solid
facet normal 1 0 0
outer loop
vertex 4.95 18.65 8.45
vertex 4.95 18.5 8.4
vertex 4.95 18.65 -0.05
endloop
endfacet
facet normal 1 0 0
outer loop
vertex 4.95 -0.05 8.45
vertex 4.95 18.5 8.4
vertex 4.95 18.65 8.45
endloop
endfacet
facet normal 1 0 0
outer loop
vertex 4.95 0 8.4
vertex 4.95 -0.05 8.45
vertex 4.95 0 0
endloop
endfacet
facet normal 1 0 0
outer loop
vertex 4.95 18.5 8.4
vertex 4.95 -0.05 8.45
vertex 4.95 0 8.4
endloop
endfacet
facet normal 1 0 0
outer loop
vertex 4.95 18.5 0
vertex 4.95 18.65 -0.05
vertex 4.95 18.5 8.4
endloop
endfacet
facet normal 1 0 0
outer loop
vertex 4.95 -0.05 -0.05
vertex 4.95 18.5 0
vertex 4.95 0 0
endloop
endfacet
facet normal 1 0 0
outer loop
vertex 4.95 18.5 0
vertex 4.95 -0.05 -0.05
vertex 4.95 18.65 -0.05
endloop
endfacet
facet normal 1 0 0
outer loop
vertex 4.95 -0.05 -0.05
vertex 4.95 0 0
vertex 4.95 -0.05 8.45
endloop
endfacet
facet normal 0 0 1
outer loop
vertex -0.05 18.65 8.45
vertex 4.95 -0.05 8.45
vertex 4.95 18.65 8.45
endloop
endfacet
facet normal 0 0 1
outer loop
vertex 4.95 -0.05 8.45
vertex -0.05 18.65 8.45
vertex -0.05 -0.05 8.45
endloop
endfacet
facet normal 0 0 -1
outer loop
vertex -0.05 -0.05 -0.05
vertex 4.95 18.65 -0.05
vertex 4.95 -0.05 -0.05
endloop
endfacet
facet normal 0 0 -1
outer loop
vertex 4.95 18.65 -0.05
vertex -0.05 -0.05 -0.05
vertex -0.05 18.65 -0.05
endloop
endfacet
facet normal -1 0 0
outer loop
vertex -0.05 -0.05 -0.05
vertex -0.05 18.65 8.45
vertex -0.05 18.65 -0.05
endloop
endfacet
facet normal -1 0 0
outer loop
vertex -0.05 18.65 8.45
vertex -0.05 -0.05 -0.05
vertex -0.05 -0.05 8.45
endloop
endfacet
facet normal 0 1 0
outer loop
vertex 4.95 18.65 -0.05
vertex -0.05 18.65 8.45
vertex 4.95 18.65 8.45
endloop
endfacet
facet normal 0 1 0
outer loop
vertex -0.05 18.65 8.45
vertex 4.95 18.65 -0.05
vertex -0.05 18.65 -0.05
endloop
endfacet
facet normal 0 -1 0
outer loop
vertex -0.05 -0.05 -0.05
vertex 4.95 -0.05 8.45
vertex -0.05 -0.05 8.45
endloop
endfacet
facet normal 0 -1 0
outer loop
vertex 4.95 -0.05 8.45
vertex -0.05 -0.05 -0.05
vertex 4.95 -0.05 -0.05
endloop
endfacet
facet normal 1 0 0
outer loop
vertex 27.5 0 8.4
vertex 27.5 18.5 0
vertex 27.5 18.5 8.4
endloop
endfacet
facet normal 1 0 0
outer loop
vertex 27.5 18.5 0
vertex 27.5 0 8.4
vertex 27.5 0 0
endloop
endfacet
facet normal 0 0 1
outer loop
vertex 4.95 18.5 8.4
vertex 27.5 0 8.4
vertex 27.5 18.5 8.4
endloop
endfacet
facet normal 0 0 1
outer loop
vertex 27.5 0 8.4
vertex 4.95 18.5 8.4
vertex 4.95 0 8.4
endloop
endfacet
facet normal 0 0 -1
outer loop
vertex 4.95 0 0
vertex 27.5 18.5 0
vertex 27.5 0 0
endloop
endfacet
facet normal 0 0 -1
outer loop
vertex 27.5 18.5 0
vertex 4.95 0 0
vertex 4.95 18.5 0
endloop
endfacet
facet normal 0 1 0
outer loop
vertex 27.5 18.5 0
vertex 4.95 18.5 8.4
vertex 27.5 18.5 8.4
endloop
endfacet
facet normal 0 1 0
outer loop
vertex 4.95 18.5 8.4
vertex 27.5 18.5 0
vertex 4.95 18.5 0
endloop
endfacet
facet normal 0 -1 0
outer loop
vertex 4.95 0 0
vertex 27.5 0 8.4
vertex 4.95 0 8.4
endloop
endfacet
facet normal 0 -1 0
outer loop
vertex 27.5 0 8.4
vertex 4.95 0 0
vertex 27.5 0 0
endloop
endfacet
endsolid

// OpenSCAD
module battery(){
  translate([-0.05,-0.05,-0.05])cube([5,18.7,8.5]);
  color("silver")cube([27.5,18.5,8.4]);
  translate([5,(18.5/2)-2.5,8]) text("battery",size=5);
}

battery();
